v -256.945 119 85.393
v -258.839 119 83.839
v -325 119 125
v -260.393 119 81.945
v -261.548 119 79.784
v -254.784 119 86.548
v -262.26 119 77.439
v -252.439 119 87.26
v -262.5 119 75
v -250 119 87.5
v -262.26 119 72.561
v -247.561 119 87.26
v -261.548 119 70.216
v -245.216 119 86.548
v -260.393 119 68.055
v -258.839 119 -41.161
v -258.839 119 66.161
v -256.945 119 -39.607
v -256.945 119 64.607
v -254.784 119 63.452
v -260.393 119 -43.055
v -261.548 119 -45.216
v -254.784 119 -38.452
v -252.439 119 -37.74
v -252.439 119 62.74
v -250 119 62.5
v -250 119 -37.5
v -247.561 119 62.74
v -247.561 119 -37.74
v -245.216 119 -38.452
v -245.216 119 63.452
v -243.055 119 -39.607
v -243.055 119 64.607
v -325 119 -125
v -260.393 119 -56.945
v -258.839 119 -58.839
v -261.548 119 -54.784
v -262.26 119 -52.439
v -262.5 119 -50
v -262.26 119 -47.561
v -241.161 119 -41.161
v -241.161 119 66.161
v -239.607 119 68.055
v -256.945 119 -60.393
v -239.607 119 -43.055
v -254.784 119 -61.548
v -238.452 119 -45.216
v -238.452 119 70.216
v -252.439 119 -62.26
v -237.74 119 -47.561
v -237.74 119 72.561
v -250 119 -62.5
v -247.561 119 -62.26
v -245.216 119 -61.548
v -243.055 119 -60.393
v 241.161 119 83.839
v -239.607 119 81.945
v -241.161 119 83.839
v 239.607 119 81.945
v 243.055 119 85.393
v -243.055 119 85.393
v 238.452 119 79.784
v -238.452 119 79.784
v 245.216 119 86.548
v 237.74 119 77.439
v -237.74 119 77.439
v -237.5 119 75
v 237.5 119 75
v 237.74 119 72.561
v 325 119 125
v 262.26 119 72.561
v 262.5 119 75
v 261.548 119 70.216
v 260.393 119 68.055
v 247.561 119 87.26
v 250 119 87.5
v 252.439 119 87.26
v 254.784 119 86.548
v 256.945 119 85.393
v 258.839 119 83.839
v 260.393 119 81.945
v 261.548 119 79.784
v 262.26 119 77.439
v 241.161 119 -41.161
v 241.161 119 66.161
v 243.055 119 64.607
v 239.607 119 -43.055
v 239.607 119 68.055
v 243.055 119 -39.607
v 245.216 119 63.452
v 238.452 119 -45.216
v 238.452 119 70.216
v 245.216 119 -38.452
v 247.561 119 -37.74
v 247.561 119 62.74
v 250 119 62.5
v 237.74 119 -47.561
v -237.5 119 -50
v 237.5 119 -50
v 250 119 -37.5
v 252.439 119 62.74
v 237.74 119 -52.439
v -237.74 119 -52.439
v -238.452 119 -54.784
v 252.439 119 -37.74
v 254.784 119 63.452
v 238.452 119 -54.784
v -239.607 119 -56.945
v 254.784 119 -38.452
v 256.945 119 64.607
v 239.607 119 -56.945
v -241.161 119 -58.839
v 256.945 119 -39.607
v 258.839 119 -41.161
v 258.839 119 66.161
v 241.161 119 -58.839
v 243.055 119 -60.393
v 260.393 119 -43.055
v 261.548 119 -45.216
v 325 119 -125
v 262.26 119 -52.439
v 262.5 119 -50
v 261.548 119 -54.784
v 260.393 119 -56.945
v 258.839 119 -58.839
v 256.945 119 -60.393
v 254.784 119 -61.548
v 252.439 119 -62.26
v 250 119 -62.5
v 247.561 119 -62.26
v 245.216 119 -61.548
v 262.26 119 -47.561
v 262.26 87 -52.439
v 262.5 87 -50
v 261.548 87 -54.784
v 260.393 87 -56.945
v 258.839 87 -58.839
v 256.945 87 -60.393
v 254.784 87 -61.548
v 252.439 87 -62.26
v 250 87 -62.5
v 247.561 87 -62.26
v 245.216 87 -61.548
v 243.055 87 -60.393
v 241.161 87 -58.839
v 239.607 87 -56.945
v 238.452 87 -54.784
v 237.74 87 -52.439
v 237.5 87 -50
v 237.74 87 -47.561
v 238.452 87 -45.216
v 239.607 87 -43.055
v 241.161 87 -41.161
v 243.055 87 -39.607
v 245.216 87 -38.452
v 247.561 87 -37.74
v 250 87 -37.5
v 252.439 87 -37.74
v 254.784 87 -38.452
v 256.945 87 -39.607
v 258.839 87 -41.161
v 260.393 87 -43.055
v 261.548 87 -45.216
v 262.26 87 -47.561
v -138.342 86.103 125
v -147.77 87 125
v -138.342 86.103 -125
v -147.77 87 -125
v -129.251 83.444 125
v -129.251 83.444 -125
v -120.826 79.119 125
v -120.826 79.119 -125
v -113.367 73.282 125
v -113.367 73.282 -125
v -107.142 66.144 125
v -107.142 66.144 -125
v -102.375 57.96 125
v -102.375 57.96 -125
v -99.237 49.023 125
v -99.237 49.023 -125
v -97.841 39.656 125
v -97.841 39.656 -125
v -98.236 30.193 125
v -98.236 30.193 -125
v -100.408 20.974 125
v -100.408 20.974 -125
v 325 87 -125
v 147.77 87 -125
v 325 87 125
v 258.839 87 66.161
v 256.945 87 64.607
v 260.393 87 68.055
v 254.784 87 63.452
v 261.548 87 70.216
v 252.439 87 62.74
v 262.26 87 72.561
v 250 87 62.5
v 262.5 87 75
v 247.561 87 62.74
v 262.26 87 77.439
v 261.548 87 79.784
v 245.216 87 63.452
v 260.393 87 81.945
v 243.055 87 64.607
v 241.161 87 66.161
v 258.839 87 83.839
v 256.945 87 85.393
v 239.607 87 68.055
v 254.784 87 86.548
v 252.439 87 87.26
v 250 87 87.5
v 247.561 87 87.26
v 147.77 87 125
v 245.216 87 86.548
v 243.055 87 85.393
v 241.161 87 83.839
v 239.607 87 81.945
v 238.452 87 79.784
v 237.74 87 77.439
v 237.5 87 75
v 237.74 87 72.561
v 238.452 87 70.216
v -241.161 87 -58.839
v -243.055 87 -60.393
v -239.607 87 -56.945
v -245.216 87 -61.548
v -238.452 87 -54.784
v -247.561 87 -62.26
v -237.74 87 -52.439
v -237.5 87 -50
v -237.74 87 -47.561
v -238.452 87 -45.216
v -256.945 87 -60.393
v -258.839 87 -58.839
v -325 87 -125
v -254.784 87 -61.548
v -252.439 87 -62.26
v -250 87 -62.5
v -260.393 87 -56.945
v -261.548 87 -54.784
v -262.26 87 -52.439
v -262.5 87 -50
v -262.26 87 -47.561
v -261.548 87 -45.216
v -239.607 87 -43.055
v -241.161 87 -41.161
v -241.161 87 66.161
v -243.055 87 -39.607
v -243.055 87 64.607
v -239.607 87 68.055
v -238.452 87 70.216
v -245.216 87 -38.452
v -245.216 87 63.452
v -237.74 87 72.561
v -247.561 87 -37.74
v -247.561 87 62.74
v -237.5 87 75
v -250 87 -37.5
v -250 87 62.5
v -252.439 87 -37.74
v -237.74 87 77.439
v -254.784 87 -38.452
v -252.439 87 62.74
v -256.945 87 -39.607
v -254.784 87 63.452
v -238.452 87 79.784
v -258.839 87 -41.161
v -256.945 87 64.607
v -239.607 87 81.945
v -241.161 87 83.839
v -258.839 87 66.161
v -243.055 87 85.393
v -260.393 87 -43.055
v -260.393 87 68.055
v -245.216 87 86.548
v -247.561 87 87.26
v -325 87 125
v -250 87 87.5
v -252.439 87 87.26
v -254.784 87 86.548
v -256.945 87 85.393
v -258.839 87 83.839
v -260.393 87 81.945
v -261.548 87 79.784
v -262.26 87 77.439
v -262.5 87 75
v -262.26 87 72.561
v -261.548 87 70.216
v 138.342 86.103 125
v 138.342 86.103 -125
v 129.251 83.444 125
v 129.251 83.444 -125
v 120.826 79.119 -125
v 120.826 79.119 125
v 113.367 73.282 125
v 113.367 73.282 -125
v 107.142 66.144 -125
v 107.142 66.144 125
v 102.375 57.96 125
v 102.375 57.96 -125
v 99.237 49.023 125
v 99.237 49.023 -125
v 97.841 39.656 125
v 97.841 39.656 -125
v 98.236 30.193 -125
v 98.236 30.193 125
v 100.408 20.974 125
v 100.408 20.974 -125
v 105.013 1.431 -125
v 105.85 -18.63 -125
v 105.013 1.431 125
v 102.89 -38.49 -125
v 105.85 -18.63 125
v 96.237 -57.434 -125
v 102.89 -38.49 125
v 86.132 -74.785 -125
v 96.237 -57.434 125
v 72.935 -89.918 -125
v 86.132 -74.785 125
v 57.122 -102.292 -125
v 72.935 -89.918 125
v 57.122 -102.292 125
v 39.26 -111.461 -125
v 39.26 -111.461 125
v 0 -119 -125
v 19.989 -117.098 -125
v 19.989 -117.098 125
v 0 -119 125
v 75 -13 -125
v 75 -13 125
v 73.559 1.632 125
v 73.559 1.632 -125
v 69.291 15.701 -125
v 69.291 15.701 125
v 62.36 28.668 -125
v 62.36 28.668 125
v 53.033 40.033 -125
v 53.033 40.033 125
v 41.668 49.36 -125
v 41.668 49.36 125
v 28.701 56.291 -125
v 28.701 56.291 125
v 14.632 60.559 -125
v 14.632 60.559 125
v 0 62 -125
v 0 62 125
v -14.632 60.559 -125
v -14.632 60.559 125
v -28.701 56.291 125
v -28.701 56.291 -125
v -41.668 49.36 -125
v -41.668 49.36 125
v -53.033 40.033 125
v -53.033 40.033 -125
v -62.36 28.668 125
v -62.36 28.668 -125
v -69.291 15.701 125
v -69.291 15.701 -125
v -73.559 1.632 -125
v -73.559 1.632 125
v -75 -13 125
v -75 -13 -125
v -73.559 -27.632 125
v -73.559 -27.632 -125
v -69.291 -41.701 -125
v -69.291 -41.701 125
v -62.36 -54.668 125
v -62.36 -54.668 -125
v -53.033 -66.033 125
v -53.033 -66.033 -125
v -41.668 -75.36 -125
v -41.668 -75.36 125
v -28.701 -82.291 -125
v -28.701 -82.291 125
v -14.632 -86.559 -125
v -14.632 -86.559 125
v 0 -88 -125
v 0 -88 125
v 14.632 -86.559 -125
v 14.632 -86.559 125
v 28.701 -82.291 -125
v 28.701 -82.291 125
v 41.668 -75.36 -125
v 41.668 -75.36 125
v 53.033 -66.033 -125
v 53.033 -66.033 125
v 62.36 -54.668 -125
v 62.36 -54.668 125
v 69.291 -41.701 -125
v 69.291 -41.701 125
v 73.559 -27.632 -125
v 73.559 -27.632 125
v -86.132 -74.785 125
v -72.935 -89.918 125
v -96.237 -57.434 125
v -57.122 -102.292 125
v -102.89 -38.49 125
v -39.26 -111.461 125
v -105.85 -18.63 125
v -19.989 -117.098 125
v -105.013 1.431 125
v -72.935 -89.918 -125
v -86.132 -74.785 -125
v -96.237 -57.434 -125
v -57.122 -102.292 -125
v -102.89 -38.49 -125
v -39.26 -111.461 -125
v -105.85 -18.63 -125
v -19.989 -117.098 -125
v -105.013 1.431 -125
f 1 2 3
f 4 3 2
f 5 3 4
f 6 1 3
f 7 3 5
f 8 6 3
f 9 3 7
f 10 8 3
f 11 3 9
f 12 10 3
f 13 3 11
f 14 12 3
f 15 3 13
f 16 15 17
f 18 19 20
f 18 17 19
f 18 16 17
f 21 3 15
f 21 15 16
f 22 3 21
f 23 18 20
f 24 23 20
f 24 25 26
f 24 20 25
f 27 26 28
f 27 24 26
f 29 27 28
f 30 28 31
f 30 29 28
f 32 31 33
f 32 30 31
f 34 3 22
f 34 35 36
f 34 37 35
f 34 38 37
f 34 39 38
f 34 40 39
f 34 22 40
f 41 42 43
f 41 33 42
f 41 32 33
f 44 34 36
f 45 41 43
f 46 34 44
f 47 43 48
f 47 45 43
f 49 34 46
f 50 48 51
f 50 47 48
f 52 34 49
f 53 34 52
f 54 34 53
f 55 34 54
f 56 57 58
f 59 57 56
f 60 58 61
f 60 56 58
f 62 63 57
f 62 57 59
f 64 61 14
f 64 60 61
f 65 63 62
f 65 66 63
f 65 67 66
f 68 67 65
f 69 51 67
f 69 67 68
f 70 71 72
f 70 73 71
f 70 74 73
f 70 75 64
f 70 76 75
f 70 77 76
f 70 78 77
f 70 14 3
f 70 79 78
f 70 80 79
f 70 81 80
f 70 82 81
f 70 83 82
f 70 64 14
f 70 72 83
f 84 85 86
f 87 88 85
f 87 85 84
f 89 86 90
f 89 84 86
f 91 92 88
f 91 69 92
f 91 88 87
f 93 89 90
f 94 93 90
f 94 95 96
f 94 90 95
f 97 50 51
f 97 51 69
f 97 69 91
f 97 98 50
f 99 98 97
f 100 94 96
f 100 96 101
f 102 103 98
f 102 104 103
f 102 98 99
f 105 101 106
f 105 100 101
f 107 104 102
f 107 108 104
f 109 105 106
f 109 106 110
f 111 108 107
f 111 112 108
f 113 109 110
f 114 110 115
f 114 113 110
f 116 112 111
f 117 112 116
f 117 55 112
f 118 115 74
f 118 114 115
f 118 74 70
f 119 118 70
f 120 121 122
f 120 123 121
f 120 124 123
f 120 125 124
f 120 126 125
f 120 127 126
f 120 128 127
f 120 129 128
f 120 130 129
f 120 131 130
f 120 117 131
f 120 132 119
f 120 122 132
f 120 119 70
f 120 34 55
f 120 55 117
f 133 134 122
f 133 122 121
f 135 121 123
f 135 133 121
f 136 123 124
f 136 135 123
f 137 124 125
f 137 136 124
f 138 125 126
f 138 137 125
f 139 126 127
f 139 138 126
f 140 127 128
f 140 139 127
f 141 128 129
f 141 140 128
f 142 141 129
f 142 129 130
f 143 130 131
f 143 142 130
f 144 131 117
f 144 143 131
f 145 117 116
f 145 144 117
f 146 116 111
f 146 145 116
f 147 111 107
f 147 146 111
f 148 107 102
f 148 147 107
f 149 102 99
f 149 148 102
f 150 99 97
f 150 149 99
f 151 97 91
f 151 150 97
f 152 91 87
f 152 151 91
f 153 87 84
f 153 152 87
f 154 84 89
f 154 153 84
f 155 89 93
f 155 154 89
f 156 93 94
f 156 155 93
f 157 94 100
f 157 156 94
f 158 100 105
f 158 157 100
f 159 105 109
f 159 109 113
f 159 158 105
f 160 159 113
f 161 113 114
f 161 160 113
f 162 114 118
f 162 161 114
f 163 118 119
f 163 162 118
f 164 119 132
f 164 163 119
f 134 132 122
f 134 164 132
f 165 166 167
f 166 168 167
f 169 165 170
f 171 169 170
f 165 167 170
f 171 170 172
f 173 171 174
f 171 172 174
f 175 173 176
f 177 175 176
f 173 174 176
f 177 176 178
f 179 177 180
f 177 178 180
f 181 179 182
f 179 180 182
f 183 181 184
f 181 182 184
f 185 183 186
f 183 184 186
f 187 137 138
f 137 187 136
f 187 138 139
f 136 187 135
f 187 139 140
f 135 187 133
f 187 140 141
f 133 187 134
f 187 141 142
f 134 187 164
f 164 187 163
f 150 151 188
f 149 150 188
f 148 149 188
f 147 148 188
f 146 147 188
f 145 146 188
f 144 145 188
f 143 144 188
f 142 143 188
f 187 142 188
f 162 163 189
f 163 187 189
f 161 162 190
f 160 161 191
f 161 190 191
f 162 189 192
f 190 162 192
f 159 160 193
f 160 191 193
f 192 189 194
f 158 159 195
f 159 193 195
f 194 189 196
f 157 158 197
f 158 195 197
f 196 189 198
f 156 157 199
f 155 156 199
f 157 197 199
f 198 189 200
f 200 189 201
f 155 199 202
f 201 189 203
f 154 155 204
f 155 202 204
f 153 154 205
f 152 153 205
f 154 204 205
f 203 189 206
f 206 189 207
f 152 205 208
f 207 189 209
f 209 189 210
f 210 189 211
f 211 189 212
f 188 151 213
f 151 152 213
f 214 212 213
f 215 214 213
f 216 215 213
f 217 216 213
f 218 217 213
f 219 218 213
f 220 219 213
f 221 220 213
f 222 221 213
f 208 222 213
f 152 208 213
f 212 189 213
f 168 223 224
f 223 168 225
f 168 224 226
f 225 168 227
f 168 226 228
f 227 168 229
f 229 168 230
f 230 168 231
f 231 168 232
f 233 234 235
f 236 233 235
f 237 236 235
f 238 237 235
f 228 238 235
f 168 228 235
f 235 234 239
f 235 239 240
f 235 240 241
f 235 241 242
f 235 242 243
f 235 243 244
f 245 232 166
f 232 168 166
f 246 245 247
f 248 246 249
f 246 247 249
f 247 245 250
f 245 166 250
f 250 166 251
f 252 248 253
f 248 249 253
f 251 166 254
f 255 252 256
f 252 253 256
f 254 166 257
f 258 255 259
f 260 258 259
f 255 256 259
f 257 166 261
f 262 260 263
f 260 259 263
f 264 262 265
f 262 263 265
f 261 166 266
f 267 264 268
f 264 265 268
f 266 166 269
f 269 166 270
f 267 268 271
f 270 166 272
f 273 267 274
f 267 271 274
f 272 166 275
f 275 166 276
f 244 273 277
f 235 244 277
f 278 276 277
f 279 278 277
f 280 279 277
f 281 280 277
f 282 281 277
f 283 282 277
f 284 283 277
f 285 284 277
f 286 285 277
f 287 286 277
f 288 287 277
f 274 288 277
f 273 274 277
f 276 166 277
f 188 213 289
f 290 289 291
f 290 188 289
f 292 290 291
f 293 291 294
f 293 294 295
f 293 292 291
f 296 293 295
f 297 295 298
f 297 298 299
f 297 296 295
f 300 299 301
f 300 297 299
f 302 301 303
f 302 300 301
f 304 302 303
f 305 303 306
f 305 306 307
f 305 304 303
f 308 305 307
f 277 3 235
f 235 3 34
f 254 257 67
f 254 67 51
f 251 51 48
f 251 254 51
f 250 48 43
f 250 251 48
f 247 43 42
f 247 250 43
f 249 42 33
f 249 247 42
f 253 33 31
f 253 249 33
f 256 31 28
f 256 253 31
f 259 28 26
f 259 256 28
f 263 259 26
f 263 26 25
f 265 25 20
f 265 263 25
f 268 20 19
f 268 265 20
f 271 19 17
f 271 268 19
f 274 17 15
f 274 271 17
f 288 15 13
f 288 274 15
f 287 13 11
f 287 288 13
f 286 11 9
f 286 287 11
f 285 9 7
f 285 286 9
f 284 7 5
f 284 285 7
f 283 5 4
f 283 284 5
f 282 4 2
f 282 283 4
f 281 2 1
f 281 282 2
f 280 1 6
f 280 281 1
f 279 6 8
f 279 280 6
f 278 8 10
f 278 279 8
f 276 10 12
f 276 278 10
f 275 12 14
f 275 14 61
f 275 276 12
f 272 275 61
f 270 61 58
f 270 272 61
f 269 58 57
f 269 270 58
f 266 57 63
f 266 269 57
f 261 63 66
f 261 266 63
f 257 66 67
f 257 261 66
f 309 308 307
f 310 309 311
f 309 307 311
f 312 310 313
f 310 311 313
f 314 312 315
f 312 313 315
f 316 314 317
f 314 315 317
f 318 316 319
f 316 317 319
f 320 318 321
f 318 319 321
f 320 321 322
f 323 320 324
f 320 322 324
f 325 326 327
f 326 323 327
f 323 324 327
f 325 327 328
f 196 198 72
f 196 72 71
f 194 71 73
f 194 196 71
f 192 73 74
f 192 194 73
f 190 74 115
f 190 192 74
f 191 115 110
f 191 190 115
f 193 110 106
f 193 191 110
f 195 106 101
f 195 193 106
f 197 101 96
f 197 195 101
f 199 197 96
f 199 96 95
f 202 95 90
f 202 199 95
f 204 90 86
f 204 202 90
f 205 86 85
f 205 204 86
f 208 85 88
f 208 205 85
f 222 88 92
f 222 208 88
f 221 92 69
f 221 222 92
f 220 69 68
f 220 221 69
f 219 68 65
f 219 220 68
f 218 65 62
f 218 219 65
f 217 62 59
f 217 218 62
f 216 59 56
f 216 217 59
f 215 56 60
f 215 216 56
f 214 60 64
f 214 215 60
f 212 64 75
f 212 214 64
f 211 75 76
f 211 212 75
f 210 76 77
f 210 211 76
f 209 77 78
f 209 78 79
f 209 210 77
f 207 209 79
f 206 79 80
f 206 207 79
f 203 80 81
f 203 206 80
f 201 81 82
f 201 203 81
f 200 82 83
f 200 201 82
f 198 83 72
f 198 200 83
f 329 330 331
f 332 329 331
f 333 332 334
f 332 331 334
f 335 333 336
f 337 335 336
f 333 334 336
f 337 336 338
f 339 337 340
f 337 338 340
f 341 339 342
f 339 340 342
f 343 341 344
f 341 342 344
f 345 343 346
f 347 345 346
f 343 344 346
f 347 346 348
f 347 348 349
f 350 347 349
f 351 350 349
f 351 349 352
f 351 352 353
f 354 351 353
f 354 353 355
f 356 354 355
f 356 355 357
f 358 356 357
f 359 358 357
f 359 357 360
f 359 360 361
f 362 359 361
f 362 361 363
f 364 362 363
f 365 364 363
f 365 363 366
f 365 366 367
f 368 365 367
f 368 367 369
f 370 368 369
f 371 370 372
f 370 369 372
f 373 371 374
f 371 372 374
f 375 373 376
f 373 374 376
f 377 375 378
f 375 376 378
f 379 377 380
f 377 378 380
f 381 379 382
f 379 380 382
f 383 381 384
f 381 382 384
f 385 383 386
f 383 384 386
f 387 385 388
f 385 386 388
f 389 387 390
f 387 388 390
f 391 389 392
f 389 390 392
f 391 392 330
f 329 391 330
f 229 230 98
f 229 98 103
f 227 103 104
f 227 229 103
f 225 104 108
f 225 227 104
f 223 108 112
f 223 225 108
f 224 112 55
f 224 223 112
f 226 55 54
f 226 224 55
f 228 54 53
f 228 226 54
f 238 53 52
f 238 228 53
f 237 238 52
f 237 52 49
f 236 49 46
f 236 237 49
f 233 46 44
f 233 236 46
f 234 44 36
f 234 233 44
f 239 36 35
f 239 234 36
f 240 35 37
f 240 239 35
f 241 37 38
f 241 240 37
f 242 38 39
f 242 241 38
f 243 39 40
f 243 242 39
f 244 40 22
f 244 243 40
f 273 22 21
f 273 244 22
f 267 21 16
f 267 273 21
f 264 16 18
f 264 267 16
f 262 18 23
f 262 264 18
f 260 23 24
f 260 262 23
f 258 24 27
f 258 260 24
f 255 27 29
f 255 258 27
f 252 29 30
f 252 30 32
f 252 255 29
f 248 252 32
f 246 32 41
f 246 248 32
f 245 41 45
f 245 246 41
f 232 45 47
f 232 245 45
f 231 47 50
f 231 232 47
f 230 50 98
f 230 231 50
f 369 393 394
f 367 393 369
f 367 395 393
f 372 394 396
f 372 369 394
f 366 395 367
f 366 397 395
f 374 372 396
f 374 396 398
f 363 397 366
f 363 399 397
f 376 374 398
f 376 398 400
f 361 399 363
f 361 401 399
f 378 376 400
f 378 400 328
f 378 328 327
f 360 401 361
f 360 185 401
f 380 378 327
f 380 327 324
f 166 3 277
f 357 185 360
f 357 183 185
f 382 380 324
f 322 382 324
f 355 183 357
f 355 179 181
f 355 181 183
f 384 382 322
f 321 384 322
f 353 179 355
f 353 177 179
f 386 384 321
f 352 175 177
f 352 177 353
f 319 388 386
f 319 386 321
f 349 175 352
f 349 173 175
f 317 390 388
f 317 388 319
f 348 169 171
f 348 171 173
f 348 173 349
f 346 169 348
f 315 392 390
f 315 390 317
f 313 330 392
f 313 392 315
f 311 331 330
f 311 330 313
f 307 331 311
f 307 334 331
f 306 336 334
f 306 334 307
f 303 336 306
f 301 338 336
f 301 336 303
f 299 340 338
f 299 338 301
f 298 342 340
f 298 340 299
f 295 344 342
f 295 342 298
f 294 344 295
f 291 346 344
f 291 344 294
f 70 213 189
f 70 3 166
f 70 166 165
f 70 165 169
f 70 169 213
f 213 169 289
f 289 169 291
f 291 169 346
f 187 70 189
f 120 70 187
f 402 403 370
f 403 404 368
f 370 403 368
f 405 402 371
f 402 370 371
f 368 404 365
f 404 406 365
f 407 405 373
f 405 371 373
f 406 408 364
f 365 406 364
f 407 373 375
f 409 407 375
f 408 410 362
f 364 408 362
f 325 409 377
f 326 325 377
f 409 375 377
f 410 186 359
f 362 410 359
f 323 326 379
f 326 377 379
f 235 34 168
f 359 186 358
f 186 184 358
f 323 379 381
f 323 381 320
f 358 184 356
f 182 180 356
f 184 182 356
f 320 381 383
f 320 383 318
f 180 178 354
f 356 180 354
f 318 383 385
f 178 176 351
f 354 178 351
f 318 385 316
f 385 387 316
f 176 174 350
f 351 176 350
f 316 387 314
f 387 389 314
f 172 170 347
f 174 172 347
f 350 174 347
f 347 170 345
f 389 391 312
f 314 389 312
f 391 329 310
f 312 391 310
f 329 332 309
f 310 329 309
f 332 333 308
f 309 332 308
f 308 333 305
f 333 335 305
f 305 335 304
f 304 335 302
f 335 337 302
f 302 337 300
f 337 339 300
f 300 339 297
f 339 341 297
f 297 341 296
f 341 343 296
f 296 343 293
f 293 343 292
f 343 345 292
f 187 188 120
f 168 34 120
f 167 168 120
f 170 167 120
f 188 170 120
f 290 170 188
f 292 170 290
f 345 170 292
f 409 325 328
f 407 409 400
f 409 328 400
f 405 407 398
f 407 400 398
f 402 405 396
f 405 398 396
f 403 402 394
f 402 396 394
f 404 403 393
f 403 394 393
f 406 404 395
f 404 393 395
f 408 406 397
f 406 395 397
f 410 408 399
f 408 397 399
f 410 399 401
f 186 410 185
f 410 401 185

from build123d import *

# Parameters (mm, degrees)
SKETCH1_W           = 650
SKETCH1_H           = 250
SKETCH1_R           = 12.5
BOSS_EXTRUDE1_DEPTH = 119
SKETCH2_R           = 75
CUT_EXTRUDE1_DEPTH  = 267
FILLET1_R           = 50


with BuildPart() as part:
    # Sketch1 → Boss-Extrude1 (new body, symmetric)
    with BuildSketch(Plane(origin=(0, 0, 0), x_dir=(1, 0, 0), z_dir=(0, 1, 0))):
        Rectangle(SKETCH1_W, SKETCH1_H)
        with Locations((-250, -75)):
            Circle(SKETCH1_R, mode=Mode.SUBTRACT)
        with Locations((250, -75)):
            Circle(SKETCH1_R, mode=Mode.SUBTRACT)
        with Locations((250, 50)):
            Circle(SKETCH1_R, mode=Mode.SUBTRACT)
        with Locations((-250, 50)):
            Circle(SKETCH1_R, mode=Mode.SUBTRACT)
    extrude(amount=BOSS_EXTRUDE1_DEPTH, both=True)

    # Sketch2 → Cut-Extrude1 (cut)
    with BuildSketch(Plane.XY.offset(125)):
        with BuildLine():
            Line((-35.156791662, 87), (-325, 87))
            Line((-325, 87), (-325, -119))
            Line((-325, -119), (-5.04e-07, -119))
            ThreePointArc((-5.04e-07, -119), (-104.489233938, -30.832554252), (-35.156791662, 87))
        make_face()
        with BuildLine():
            Line((325, -119), (325, 87))
            Line((325, 87), (35.156791662, 87))
            ThreePointArc((35.156791662, 87), (104.489233853, -30.832554748), (-5.04e-07, -119))
            Line((-5.04e-07, -119), (325, -119))
        make_face()
        with Locations((0, -13)):
            Circle(SKETCH2_R)
    extrude(amount=-CUT_EXTRUDE1_DEPTH, mode=Mode.SUBTRACT)

    # Fillet1
    fillet1_edges = [part.edges().sort_by_distance(p)[0] for p in [
        (-35.156791662, 87, 0),
        (35.156791662, 87, 0),
    ]]
    fillet(fillet1_edges, radius=FILLET1_R)


solid = part.part
